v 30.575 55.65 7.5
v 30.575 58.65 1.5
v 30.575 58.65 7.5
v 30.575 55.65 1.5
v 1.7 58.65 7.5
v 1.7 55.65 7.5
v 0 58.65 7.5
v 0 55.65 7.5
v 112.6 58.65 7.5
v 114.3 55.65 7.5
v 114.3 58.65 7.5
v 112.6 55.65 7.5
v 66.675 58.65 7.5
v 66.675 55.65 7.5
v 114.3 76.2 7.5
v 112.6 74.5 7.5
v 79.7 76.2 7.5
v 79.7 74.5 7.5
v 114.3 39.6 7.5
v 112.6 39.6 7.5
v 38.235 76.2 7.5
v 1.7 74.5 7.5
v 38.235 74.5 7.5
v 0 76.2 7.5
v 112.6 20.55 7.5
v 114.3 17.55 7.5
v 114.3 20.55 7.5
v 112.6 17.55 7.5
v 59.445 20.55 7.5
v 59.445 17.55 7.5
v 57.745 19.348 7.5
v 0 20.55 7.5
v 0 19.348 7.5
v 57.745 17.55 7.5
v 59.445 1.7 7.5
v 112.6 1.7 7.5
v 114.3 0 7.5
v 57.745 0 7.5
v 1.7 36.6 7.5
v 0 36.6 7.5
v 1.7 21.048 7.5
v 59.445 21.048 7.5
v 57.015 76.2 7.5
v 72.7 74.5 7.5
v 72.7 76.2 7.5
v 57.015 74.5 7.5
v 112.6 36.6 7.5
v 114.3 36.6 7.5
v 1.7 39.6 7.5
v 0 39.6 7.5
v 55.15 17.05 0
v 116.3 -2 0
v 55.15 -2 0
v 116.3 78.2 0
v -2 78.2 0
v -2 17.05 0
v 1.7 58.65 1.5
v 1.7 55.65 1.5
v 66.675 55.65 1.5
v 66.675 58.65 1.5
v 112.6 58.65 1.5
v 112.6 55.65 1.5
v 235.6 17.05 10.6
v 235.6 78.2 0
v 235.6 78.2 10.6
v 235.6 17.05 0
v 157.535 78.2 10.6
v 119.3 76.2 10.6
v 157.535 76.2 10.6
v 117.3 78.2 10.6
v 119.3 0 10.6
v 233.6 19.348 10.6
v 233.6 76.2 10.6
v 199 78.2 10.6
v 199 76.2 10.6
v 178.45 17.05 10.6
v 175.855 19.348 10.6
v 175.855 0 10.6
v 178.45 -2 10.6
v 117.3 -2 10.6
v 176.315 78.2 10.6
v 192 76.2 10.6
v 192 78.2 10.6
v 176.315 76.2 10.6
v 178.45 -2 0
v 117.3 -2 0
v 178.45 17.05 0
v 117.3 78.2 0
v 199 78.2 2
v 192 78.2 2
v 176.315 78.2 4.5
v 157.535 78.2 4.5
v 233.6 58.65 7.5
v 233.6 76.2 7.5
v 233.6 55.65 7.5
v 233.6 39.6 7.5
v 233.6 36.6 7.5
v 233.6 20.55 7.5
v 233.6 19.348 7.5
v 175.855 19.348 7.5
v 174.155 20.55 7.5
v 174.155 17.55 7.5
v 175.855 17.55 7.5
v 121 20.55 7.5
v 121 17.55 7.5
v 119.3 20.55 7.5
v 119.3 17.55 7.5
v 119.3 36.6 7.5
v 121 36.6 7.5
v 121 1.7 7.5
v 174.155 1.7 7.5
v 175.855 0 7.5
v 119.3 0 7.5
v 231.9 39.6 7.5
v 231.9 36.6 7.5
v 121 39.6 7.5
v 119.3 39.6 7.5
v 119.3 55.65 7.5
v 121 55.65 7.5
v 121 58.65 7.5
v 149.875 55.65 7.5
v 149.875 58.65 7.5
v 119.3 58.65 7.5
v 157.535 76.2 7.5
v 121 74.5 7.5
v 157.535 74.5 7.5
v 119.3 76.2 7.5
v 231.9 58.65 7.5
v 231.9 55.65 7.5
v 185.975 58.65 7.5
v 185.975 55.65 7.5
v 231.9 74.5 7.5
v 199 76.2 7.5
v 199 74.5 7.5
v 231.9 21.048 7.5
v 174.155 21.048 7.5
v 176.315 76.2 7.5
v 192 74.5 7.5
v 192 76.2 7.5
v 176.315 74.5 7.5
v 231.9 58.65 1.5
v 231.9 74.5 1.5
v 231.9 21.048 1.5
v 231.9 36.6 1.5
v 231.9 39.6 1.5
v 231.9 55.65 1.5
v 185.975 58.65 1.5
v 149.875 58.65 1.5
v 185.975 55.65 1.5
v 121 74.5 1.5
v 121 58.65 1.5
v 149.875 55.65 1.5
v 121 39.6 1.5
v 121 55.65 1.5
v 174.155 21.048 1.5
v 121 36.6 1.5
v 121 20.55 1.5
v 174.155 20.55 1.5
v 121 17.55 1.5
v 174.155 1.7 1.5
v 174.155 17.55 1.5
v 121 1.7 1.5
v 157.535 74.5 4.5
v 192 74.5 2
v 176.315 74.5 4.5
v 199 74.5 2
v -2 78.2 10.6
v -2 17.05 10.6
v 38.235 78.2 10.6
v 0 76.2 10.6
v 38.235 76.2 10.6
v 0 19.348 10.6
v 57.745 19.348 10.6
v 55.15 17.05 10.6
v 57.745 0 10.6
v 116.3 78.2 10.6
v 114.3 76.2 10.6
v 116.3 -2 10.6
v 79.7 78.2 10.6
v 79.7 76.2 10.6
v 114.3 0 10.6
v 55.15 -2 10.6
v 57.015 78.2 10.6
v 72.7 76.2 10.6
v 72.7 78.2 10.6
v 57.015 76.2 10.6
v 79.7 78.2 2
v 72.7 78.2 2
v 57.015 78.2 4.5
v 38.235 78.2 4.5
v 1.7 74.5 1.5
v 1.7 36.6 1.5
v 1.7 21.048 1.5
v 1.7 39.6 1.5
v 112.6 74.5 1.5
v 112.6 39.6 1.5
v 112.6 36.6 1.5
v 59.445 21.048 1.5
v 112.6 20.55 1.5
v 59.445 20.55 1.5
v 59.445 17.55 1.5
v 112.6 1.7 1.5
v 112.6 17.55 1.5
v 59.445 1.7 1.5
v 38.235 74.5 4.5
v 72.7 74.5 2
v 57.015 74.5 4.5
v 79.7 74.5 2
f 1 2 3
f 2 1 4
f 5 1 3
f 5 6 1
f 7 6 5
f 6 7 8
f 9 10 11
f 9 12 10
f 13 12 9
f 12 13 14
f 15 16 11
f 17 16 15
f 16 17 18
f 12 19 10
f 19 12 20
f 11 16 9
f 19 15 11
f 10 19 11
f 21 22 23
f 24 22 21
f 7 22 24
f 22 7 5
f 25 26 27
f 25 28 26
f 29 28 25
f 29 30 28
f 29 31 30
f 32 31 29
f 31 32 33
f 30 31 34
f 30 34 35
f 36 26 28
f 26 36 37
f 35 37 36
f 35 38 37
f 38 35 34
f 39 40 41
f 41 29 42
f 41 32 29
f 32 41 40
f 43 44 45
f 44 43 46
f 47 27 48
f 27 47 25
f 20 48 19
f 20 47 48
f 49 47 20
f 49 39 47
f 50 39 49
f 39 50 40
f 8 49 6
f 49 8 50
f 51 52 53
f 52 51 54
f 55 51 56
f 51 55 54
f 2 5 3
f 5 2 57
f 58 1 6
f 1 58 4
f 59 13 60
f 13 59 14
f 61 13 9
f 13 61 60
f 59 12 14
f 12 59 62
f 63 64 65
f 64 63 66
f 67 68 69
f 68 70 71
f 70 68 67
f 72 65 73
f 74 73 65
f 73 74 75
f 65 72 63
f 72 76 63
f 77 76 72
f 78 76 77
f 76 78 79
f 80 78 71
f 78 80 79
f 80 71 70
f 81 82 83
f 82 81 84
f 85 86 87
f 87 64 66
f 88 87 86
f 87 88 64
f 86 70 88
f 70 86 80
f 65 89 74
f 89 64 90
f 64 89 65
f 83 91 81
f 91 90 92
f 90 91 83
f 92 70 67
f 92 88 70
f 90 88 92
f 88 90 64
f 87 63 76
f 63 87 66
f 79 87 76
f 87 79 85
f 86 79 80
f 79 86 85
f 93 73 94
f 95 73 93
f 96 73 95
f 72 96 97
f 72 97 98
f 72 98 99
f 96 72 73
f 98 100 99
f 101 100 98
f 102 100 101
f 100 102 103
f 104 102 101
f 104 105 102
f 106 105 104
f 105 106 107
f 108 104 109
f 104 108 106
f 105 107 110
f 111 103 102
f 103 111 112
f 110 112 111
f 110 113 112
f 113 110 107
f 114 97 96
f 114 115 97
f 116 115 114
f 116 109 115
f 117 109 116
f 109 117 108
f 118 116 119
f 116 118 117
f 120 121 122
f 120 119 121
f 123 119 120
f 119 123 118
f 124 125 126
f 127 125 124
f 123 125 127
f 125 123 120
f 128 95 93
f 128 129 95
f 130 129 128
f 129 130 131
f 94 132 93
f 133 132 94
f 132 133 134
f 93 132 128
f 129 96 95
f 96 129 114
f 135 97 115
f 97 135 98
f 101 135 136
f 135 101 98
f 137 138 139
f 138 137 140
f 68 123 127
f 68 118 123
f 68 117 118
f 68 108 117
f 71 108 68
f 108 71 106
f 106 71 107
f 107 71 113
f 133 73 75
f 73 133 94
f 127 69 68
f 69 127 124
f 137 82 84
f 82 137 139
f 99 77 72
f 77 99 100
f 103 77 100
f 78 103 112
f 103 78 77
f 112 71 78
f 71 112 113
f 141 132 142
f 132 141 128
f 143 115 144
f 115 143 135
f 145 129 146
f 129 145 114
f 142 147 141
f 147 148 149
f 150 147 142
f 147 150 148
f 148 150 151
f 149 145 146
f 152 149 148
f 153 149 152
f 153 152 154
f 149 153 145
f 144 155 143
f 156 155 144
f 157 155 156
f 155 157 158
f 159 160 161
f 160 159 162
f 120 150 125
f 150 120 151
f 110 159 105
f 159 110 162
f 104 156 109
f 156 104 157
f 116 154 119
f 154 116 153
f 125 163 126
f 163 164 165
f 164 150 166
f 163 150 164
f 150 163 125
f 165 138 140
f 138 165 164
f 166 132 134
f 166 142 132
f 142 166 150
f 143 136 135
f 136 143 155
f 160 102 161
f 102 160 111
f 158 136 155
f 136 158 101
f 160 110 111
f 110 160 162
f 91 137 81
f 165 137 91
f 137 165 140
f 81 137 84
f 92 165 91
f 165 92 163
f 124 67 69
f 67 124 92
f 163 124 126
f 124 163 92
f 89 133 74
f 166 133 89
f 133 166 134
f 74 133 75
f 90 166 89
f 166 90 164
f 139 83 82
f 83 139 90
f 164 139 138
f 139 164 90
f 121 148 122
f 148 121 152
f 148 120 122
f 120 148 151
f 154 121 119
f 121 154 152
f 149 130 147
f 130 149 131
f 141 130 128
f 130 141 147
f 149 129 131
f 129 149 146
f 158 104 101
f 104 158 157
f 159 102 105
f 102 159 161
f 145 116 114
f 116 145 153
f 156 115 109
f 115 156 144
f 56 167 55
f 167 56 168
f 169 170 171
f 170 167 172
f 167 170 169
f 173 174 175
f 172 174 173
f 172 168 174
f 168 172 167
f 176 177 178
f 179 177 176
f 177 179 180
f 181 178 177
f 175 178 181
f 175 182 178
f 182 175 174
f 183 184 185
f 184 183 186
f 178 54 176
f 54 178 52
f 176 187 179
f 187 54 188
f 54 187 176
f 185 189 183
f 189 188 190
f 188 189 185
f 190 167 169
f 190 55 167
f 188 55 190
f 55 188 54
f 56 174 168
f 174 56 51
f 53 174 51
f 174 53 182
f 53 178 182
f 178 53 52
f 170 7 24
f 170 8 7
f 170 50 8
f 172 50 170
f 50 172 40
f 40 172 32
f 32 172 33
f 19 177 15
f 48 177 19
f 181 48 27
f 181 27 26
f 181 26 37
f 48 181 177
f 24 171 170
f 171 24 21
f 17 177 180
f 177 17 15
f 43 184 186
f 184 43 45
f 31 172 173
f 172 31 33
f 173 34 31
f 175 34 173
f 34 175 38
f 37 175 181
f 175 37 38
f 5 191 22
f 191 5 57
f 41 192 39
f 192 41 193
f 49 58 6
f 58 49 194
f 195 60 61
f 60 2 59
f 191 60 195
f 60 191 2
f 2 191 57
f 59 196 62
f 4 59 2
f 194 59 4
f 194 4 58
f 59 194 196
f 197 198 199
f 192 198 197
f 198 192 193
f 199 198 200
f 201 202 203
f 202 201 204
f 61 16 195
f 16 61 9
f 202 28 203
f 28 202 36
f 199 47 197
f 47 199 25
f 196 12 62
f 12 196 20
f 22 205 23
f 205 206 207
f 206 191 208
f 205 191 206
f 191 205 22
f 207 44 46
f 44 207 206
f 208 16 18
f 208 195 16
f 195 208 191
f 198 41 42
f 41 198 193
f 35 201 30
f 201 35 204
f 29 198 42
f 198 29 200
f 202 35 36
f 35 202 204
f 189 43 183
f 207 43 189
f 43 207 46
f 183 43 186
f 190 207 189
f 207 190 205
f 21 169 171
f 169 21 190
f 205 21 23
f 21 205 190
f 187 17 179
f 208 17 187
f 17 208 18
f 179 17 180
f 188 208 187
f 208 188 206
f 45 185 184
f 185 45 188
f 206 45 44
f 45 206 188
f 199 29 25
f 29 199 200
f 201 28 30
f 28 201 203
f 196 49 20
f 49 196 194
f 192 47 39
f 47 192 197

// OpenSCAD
$unit = 19.05;
$100mil = 2.54;
$pcb_grid = 0.297658;
$wall_thickness = 2;
$support_thickness = 3.0;
$wall_height = 1.6 + 1.5;
$floor_thickness = 1.7;
$cover_thickness = 1.5;
$bottom_height = 6 + $cover_thickness;

$slop = 1;
$promicro_width  = 7 * $100mil + $slop;
$promicro_height = 2.5 + $slop / 2;
$trrs_width = 6 + $slop;
$trrs_height = 5 + $slop / 2;

module shape (extra_thickness = 0, height = 0, offset1 = 0, offset2 = 0) {
  translate([- extra_thickness, $unit - extra_thickness + offset2, 0])
    cube([6 * $unit + extra_thickness * 2, 3 * $unit + extra_thickness * 2 - offset2, height]);
  translate([- extra_thickness, - extra_thickness, 0])
    cube([3 * $unit + extra_thickness * 2 - offset1, 20, height]);
}

// case without promicro and trrs holes
module model1 (mirror = 0) {
  translate([3 * $unit ,0 ,0]) mirror([mirror, 0, 0]) translate([- 3 * $unit, 0, 0]) difference () {
    shape($wall_thickness, $bottom_height + $wall_height);
    translate([0, 0, $bottom_height]) shape(0, 1000, $pcb_grid * 2, $pcb_grid);
    translate([0, 0, $cover_thickness]) shape(-$floor_thickness, 1000, $pcb_grid * 2, $pcb_grid);
  }
}

// model1 with promicro and trrs holes
module model2 (mirror = 0) {
  difference () {
    model1(mirror);
    // promicro
    translate([2.5 * $unit - $promicro_width / 2, 4 * $unit - $floor_thickness, $bottom_height - $promicro_height])
      cube([$promicro_width, 1000, 1000]);
    // trrs
    translate([4 * $unit - $trrs_width / 2, 4 * $unit - $floor_thickness, $bottom_height - $trrs_height])
      cube([$trrs_width, 1000, 1000]);
  }
}

// model2 with supports
module model3 (mirror = 0) {
  model2(mirror);
  translate([0, 1 * $unit - $support_thickness / 2, 0])
    cube([$wall_thickness + 6 * $unit, $support_thickness, $bottom_height]);
  translate([0, 2 * $unit - $support_thickness / 2, 0])
    cube([$wall_thickness + 6 * $unit, $support_thickness, $bottom_height]);
  translate([0, 3 * $unit - $support_thickness / 2, 0]) {
    cube([$wall_thickness + 1.5 * $unit, $support_thickness, $bottom_height]);
    translate([3.5 * $unit, 0, 0])
      cube([2.5 * $unit, $support_thickness, $bottom_height]);
  }
}

module pcb_preview_kicad (left = false) {
  translate([9.5, 47.5, 1.6]) import("../pcb/switch42.stl");
}

translate([6 * $unit + $wall_thickness * 2 + $slop, 0, 0]) model3();
model3(1);
//translate([6 * $unit + $wall_thickness * 2 + $slop, 4 * $unit + $wall_thickness * 2 + $slop, 0]) model3(0);
//translate([0, 4 * $unit + $wall_thickness * 2 + $slop, 0]) model3(1);
//transalte([0, 10 * $unit, 0]) {
//  translate([6 * $unit + $wall_thickness * 2 + $slop, 0, 0]) model3();
//  model3(1);
//}
//color([1, 1, 1, 0.1]) translate([0, $unit, $bottom_height]) pcb_preview_kicad();
